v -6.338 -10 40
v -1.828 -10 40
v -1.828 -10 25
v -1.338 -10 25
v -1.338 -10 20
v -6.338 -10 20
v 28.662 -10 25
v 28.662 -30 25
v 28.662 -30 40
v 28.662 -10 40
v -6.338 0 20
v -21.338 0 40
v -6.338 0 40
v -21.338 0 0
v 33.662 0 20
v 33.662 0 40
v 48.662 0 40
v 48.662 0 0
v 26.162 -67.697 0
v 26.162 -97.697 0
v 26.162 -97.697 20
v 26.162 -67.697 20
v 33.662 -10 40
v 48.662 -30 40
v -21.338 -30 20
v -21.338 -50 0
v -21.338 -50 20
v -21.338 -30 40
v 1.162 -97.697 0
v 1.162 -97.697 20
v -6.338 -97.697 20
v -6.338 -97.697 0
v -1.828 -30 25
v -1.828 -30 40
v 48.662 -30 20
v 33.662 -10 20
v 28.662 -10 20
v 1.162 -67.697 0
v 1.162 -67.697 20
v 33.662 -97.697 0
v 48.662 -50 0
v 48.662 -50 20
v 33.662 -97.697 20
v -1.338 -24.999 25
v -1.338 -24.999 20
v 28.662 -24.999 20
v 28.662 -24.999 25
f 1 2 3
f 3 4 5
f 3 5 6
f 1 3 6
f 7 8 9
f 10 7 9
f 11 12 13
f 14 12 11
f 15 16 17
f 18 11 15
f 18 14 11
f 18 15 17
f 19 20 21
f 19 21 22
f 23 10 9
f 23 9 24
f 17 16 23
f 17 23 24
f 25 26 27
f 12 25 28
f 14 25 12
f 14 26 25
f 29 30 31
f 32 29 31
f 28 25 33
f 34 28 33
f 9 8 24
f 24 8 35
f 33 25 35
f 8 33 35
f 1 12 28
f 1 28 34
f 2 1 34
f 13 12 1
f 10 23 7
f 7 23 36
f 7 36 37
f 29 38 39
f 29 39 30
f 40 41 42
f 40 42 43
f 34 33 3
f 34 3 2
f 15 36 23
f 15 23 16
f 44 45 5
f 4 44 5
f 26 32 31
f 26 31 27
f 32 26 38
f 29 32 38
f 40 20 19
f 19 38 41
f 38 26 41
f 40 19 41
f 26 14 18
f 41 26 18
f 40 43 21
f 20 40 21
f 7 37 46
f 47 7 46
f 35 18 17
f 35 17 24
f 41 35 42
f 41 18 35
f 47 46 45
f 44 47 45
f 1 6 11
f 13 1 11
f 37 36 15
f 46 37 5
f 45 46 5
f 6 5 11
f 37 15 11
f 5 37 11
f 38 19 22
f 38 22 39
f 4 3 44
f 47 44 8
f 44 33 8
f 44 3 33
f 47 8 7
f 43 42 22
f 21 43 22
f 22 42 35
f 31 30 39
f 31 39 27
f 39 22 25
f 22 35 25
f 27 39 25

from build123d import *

# Parameters (mm, degrees)
BOSS_EXTRUDE1_DEPTH = 20
SKETCH2_W           = 15
SKETCH2_H           = 10
BOSS_EXTRUDE3_DEPTH = 40
BOSS_EXTRUDE5_DEPTH = 40
SKETCH6_W           = 30
SKETCH6_H           = 15
CUT_EXTRUDE2_DEPTH  = 40
SKETCH8_W           = 0.49
SKETCH8_H           = 15
CUT_EXTRUDE4_DEPTH  = 40


with BuildPart() as part:
    # Sketch1 → Boss-Extrude1 (new body)
    with BuildSketch(Plane.XY):
        Polygon((26.1619919, -97.696960071), (26.1619919, -67.696960071), (1.1619919, -67.696960071), (1.1619919, -97.696960071), (-6.3380081, -97.696960071), (-21.3380081, -50), (-21.3380081, 0), (48.6619919, 0), (48.6619919, -50), (33.6619919, -97.696960071), align=None)
    extrude(amount=BOSS_EXTRUDE1_DEPTH)

    # Sketch2 → Boss-Extrude3 (add)
    with BuildSketch(Plane.XY):
        with Locations((41.1619919, -5)):
            Rectangle(SKETCH2_W, SKETCH2_H)
        with Locations((-13.8380081, -5)):
            Rectangle(SKETCH2_W, SKETCH2_H)
    extrude(amount=BOSS_EXTRUDE3_DEPTH)

    # Sketch4 → Boss-Extrude5 (add)
    with BuildSketch(Plane.XY):
        Polygon((-21.3380081, -30), (48.6619919, -30), (48.6619919, -10), (28.6619919, -10), (28.6619919, -24.999154542), (13.6619919, -24.999154542), (-1.3380081, -24.999154542), (-1.3380081, -10), (-21.3380081, -10), align=None)
    extrude(amount=BOSS_EXTRUDE5_DEPTH)

    # Sketch6 → Cut-Extrude2 (cut)
    with BuildSketch(Plane.XZ.offset(30)):
        with Locations((13.172194731, 32.5)):
            Rectangle(SKETCH6_W, SKETCH6_H)
    extrude(amount=-CUT_EXTRUDE2_DEPTH, mode=Mode.SUBTRACT)

    # Sketch8 → Cut-Extrude4 (cut)
    with BuildSketch(Plane.XZ.offset(30)):
        with Locations((28.417194731, 32.5)):
            Rectangle(SKETCH8_W, SKETCH8_H)
    extrude(amount=-CUT_EXTRUDE4_DEPTH, mode=Mode.SUBTRACT)


solid = part.part
